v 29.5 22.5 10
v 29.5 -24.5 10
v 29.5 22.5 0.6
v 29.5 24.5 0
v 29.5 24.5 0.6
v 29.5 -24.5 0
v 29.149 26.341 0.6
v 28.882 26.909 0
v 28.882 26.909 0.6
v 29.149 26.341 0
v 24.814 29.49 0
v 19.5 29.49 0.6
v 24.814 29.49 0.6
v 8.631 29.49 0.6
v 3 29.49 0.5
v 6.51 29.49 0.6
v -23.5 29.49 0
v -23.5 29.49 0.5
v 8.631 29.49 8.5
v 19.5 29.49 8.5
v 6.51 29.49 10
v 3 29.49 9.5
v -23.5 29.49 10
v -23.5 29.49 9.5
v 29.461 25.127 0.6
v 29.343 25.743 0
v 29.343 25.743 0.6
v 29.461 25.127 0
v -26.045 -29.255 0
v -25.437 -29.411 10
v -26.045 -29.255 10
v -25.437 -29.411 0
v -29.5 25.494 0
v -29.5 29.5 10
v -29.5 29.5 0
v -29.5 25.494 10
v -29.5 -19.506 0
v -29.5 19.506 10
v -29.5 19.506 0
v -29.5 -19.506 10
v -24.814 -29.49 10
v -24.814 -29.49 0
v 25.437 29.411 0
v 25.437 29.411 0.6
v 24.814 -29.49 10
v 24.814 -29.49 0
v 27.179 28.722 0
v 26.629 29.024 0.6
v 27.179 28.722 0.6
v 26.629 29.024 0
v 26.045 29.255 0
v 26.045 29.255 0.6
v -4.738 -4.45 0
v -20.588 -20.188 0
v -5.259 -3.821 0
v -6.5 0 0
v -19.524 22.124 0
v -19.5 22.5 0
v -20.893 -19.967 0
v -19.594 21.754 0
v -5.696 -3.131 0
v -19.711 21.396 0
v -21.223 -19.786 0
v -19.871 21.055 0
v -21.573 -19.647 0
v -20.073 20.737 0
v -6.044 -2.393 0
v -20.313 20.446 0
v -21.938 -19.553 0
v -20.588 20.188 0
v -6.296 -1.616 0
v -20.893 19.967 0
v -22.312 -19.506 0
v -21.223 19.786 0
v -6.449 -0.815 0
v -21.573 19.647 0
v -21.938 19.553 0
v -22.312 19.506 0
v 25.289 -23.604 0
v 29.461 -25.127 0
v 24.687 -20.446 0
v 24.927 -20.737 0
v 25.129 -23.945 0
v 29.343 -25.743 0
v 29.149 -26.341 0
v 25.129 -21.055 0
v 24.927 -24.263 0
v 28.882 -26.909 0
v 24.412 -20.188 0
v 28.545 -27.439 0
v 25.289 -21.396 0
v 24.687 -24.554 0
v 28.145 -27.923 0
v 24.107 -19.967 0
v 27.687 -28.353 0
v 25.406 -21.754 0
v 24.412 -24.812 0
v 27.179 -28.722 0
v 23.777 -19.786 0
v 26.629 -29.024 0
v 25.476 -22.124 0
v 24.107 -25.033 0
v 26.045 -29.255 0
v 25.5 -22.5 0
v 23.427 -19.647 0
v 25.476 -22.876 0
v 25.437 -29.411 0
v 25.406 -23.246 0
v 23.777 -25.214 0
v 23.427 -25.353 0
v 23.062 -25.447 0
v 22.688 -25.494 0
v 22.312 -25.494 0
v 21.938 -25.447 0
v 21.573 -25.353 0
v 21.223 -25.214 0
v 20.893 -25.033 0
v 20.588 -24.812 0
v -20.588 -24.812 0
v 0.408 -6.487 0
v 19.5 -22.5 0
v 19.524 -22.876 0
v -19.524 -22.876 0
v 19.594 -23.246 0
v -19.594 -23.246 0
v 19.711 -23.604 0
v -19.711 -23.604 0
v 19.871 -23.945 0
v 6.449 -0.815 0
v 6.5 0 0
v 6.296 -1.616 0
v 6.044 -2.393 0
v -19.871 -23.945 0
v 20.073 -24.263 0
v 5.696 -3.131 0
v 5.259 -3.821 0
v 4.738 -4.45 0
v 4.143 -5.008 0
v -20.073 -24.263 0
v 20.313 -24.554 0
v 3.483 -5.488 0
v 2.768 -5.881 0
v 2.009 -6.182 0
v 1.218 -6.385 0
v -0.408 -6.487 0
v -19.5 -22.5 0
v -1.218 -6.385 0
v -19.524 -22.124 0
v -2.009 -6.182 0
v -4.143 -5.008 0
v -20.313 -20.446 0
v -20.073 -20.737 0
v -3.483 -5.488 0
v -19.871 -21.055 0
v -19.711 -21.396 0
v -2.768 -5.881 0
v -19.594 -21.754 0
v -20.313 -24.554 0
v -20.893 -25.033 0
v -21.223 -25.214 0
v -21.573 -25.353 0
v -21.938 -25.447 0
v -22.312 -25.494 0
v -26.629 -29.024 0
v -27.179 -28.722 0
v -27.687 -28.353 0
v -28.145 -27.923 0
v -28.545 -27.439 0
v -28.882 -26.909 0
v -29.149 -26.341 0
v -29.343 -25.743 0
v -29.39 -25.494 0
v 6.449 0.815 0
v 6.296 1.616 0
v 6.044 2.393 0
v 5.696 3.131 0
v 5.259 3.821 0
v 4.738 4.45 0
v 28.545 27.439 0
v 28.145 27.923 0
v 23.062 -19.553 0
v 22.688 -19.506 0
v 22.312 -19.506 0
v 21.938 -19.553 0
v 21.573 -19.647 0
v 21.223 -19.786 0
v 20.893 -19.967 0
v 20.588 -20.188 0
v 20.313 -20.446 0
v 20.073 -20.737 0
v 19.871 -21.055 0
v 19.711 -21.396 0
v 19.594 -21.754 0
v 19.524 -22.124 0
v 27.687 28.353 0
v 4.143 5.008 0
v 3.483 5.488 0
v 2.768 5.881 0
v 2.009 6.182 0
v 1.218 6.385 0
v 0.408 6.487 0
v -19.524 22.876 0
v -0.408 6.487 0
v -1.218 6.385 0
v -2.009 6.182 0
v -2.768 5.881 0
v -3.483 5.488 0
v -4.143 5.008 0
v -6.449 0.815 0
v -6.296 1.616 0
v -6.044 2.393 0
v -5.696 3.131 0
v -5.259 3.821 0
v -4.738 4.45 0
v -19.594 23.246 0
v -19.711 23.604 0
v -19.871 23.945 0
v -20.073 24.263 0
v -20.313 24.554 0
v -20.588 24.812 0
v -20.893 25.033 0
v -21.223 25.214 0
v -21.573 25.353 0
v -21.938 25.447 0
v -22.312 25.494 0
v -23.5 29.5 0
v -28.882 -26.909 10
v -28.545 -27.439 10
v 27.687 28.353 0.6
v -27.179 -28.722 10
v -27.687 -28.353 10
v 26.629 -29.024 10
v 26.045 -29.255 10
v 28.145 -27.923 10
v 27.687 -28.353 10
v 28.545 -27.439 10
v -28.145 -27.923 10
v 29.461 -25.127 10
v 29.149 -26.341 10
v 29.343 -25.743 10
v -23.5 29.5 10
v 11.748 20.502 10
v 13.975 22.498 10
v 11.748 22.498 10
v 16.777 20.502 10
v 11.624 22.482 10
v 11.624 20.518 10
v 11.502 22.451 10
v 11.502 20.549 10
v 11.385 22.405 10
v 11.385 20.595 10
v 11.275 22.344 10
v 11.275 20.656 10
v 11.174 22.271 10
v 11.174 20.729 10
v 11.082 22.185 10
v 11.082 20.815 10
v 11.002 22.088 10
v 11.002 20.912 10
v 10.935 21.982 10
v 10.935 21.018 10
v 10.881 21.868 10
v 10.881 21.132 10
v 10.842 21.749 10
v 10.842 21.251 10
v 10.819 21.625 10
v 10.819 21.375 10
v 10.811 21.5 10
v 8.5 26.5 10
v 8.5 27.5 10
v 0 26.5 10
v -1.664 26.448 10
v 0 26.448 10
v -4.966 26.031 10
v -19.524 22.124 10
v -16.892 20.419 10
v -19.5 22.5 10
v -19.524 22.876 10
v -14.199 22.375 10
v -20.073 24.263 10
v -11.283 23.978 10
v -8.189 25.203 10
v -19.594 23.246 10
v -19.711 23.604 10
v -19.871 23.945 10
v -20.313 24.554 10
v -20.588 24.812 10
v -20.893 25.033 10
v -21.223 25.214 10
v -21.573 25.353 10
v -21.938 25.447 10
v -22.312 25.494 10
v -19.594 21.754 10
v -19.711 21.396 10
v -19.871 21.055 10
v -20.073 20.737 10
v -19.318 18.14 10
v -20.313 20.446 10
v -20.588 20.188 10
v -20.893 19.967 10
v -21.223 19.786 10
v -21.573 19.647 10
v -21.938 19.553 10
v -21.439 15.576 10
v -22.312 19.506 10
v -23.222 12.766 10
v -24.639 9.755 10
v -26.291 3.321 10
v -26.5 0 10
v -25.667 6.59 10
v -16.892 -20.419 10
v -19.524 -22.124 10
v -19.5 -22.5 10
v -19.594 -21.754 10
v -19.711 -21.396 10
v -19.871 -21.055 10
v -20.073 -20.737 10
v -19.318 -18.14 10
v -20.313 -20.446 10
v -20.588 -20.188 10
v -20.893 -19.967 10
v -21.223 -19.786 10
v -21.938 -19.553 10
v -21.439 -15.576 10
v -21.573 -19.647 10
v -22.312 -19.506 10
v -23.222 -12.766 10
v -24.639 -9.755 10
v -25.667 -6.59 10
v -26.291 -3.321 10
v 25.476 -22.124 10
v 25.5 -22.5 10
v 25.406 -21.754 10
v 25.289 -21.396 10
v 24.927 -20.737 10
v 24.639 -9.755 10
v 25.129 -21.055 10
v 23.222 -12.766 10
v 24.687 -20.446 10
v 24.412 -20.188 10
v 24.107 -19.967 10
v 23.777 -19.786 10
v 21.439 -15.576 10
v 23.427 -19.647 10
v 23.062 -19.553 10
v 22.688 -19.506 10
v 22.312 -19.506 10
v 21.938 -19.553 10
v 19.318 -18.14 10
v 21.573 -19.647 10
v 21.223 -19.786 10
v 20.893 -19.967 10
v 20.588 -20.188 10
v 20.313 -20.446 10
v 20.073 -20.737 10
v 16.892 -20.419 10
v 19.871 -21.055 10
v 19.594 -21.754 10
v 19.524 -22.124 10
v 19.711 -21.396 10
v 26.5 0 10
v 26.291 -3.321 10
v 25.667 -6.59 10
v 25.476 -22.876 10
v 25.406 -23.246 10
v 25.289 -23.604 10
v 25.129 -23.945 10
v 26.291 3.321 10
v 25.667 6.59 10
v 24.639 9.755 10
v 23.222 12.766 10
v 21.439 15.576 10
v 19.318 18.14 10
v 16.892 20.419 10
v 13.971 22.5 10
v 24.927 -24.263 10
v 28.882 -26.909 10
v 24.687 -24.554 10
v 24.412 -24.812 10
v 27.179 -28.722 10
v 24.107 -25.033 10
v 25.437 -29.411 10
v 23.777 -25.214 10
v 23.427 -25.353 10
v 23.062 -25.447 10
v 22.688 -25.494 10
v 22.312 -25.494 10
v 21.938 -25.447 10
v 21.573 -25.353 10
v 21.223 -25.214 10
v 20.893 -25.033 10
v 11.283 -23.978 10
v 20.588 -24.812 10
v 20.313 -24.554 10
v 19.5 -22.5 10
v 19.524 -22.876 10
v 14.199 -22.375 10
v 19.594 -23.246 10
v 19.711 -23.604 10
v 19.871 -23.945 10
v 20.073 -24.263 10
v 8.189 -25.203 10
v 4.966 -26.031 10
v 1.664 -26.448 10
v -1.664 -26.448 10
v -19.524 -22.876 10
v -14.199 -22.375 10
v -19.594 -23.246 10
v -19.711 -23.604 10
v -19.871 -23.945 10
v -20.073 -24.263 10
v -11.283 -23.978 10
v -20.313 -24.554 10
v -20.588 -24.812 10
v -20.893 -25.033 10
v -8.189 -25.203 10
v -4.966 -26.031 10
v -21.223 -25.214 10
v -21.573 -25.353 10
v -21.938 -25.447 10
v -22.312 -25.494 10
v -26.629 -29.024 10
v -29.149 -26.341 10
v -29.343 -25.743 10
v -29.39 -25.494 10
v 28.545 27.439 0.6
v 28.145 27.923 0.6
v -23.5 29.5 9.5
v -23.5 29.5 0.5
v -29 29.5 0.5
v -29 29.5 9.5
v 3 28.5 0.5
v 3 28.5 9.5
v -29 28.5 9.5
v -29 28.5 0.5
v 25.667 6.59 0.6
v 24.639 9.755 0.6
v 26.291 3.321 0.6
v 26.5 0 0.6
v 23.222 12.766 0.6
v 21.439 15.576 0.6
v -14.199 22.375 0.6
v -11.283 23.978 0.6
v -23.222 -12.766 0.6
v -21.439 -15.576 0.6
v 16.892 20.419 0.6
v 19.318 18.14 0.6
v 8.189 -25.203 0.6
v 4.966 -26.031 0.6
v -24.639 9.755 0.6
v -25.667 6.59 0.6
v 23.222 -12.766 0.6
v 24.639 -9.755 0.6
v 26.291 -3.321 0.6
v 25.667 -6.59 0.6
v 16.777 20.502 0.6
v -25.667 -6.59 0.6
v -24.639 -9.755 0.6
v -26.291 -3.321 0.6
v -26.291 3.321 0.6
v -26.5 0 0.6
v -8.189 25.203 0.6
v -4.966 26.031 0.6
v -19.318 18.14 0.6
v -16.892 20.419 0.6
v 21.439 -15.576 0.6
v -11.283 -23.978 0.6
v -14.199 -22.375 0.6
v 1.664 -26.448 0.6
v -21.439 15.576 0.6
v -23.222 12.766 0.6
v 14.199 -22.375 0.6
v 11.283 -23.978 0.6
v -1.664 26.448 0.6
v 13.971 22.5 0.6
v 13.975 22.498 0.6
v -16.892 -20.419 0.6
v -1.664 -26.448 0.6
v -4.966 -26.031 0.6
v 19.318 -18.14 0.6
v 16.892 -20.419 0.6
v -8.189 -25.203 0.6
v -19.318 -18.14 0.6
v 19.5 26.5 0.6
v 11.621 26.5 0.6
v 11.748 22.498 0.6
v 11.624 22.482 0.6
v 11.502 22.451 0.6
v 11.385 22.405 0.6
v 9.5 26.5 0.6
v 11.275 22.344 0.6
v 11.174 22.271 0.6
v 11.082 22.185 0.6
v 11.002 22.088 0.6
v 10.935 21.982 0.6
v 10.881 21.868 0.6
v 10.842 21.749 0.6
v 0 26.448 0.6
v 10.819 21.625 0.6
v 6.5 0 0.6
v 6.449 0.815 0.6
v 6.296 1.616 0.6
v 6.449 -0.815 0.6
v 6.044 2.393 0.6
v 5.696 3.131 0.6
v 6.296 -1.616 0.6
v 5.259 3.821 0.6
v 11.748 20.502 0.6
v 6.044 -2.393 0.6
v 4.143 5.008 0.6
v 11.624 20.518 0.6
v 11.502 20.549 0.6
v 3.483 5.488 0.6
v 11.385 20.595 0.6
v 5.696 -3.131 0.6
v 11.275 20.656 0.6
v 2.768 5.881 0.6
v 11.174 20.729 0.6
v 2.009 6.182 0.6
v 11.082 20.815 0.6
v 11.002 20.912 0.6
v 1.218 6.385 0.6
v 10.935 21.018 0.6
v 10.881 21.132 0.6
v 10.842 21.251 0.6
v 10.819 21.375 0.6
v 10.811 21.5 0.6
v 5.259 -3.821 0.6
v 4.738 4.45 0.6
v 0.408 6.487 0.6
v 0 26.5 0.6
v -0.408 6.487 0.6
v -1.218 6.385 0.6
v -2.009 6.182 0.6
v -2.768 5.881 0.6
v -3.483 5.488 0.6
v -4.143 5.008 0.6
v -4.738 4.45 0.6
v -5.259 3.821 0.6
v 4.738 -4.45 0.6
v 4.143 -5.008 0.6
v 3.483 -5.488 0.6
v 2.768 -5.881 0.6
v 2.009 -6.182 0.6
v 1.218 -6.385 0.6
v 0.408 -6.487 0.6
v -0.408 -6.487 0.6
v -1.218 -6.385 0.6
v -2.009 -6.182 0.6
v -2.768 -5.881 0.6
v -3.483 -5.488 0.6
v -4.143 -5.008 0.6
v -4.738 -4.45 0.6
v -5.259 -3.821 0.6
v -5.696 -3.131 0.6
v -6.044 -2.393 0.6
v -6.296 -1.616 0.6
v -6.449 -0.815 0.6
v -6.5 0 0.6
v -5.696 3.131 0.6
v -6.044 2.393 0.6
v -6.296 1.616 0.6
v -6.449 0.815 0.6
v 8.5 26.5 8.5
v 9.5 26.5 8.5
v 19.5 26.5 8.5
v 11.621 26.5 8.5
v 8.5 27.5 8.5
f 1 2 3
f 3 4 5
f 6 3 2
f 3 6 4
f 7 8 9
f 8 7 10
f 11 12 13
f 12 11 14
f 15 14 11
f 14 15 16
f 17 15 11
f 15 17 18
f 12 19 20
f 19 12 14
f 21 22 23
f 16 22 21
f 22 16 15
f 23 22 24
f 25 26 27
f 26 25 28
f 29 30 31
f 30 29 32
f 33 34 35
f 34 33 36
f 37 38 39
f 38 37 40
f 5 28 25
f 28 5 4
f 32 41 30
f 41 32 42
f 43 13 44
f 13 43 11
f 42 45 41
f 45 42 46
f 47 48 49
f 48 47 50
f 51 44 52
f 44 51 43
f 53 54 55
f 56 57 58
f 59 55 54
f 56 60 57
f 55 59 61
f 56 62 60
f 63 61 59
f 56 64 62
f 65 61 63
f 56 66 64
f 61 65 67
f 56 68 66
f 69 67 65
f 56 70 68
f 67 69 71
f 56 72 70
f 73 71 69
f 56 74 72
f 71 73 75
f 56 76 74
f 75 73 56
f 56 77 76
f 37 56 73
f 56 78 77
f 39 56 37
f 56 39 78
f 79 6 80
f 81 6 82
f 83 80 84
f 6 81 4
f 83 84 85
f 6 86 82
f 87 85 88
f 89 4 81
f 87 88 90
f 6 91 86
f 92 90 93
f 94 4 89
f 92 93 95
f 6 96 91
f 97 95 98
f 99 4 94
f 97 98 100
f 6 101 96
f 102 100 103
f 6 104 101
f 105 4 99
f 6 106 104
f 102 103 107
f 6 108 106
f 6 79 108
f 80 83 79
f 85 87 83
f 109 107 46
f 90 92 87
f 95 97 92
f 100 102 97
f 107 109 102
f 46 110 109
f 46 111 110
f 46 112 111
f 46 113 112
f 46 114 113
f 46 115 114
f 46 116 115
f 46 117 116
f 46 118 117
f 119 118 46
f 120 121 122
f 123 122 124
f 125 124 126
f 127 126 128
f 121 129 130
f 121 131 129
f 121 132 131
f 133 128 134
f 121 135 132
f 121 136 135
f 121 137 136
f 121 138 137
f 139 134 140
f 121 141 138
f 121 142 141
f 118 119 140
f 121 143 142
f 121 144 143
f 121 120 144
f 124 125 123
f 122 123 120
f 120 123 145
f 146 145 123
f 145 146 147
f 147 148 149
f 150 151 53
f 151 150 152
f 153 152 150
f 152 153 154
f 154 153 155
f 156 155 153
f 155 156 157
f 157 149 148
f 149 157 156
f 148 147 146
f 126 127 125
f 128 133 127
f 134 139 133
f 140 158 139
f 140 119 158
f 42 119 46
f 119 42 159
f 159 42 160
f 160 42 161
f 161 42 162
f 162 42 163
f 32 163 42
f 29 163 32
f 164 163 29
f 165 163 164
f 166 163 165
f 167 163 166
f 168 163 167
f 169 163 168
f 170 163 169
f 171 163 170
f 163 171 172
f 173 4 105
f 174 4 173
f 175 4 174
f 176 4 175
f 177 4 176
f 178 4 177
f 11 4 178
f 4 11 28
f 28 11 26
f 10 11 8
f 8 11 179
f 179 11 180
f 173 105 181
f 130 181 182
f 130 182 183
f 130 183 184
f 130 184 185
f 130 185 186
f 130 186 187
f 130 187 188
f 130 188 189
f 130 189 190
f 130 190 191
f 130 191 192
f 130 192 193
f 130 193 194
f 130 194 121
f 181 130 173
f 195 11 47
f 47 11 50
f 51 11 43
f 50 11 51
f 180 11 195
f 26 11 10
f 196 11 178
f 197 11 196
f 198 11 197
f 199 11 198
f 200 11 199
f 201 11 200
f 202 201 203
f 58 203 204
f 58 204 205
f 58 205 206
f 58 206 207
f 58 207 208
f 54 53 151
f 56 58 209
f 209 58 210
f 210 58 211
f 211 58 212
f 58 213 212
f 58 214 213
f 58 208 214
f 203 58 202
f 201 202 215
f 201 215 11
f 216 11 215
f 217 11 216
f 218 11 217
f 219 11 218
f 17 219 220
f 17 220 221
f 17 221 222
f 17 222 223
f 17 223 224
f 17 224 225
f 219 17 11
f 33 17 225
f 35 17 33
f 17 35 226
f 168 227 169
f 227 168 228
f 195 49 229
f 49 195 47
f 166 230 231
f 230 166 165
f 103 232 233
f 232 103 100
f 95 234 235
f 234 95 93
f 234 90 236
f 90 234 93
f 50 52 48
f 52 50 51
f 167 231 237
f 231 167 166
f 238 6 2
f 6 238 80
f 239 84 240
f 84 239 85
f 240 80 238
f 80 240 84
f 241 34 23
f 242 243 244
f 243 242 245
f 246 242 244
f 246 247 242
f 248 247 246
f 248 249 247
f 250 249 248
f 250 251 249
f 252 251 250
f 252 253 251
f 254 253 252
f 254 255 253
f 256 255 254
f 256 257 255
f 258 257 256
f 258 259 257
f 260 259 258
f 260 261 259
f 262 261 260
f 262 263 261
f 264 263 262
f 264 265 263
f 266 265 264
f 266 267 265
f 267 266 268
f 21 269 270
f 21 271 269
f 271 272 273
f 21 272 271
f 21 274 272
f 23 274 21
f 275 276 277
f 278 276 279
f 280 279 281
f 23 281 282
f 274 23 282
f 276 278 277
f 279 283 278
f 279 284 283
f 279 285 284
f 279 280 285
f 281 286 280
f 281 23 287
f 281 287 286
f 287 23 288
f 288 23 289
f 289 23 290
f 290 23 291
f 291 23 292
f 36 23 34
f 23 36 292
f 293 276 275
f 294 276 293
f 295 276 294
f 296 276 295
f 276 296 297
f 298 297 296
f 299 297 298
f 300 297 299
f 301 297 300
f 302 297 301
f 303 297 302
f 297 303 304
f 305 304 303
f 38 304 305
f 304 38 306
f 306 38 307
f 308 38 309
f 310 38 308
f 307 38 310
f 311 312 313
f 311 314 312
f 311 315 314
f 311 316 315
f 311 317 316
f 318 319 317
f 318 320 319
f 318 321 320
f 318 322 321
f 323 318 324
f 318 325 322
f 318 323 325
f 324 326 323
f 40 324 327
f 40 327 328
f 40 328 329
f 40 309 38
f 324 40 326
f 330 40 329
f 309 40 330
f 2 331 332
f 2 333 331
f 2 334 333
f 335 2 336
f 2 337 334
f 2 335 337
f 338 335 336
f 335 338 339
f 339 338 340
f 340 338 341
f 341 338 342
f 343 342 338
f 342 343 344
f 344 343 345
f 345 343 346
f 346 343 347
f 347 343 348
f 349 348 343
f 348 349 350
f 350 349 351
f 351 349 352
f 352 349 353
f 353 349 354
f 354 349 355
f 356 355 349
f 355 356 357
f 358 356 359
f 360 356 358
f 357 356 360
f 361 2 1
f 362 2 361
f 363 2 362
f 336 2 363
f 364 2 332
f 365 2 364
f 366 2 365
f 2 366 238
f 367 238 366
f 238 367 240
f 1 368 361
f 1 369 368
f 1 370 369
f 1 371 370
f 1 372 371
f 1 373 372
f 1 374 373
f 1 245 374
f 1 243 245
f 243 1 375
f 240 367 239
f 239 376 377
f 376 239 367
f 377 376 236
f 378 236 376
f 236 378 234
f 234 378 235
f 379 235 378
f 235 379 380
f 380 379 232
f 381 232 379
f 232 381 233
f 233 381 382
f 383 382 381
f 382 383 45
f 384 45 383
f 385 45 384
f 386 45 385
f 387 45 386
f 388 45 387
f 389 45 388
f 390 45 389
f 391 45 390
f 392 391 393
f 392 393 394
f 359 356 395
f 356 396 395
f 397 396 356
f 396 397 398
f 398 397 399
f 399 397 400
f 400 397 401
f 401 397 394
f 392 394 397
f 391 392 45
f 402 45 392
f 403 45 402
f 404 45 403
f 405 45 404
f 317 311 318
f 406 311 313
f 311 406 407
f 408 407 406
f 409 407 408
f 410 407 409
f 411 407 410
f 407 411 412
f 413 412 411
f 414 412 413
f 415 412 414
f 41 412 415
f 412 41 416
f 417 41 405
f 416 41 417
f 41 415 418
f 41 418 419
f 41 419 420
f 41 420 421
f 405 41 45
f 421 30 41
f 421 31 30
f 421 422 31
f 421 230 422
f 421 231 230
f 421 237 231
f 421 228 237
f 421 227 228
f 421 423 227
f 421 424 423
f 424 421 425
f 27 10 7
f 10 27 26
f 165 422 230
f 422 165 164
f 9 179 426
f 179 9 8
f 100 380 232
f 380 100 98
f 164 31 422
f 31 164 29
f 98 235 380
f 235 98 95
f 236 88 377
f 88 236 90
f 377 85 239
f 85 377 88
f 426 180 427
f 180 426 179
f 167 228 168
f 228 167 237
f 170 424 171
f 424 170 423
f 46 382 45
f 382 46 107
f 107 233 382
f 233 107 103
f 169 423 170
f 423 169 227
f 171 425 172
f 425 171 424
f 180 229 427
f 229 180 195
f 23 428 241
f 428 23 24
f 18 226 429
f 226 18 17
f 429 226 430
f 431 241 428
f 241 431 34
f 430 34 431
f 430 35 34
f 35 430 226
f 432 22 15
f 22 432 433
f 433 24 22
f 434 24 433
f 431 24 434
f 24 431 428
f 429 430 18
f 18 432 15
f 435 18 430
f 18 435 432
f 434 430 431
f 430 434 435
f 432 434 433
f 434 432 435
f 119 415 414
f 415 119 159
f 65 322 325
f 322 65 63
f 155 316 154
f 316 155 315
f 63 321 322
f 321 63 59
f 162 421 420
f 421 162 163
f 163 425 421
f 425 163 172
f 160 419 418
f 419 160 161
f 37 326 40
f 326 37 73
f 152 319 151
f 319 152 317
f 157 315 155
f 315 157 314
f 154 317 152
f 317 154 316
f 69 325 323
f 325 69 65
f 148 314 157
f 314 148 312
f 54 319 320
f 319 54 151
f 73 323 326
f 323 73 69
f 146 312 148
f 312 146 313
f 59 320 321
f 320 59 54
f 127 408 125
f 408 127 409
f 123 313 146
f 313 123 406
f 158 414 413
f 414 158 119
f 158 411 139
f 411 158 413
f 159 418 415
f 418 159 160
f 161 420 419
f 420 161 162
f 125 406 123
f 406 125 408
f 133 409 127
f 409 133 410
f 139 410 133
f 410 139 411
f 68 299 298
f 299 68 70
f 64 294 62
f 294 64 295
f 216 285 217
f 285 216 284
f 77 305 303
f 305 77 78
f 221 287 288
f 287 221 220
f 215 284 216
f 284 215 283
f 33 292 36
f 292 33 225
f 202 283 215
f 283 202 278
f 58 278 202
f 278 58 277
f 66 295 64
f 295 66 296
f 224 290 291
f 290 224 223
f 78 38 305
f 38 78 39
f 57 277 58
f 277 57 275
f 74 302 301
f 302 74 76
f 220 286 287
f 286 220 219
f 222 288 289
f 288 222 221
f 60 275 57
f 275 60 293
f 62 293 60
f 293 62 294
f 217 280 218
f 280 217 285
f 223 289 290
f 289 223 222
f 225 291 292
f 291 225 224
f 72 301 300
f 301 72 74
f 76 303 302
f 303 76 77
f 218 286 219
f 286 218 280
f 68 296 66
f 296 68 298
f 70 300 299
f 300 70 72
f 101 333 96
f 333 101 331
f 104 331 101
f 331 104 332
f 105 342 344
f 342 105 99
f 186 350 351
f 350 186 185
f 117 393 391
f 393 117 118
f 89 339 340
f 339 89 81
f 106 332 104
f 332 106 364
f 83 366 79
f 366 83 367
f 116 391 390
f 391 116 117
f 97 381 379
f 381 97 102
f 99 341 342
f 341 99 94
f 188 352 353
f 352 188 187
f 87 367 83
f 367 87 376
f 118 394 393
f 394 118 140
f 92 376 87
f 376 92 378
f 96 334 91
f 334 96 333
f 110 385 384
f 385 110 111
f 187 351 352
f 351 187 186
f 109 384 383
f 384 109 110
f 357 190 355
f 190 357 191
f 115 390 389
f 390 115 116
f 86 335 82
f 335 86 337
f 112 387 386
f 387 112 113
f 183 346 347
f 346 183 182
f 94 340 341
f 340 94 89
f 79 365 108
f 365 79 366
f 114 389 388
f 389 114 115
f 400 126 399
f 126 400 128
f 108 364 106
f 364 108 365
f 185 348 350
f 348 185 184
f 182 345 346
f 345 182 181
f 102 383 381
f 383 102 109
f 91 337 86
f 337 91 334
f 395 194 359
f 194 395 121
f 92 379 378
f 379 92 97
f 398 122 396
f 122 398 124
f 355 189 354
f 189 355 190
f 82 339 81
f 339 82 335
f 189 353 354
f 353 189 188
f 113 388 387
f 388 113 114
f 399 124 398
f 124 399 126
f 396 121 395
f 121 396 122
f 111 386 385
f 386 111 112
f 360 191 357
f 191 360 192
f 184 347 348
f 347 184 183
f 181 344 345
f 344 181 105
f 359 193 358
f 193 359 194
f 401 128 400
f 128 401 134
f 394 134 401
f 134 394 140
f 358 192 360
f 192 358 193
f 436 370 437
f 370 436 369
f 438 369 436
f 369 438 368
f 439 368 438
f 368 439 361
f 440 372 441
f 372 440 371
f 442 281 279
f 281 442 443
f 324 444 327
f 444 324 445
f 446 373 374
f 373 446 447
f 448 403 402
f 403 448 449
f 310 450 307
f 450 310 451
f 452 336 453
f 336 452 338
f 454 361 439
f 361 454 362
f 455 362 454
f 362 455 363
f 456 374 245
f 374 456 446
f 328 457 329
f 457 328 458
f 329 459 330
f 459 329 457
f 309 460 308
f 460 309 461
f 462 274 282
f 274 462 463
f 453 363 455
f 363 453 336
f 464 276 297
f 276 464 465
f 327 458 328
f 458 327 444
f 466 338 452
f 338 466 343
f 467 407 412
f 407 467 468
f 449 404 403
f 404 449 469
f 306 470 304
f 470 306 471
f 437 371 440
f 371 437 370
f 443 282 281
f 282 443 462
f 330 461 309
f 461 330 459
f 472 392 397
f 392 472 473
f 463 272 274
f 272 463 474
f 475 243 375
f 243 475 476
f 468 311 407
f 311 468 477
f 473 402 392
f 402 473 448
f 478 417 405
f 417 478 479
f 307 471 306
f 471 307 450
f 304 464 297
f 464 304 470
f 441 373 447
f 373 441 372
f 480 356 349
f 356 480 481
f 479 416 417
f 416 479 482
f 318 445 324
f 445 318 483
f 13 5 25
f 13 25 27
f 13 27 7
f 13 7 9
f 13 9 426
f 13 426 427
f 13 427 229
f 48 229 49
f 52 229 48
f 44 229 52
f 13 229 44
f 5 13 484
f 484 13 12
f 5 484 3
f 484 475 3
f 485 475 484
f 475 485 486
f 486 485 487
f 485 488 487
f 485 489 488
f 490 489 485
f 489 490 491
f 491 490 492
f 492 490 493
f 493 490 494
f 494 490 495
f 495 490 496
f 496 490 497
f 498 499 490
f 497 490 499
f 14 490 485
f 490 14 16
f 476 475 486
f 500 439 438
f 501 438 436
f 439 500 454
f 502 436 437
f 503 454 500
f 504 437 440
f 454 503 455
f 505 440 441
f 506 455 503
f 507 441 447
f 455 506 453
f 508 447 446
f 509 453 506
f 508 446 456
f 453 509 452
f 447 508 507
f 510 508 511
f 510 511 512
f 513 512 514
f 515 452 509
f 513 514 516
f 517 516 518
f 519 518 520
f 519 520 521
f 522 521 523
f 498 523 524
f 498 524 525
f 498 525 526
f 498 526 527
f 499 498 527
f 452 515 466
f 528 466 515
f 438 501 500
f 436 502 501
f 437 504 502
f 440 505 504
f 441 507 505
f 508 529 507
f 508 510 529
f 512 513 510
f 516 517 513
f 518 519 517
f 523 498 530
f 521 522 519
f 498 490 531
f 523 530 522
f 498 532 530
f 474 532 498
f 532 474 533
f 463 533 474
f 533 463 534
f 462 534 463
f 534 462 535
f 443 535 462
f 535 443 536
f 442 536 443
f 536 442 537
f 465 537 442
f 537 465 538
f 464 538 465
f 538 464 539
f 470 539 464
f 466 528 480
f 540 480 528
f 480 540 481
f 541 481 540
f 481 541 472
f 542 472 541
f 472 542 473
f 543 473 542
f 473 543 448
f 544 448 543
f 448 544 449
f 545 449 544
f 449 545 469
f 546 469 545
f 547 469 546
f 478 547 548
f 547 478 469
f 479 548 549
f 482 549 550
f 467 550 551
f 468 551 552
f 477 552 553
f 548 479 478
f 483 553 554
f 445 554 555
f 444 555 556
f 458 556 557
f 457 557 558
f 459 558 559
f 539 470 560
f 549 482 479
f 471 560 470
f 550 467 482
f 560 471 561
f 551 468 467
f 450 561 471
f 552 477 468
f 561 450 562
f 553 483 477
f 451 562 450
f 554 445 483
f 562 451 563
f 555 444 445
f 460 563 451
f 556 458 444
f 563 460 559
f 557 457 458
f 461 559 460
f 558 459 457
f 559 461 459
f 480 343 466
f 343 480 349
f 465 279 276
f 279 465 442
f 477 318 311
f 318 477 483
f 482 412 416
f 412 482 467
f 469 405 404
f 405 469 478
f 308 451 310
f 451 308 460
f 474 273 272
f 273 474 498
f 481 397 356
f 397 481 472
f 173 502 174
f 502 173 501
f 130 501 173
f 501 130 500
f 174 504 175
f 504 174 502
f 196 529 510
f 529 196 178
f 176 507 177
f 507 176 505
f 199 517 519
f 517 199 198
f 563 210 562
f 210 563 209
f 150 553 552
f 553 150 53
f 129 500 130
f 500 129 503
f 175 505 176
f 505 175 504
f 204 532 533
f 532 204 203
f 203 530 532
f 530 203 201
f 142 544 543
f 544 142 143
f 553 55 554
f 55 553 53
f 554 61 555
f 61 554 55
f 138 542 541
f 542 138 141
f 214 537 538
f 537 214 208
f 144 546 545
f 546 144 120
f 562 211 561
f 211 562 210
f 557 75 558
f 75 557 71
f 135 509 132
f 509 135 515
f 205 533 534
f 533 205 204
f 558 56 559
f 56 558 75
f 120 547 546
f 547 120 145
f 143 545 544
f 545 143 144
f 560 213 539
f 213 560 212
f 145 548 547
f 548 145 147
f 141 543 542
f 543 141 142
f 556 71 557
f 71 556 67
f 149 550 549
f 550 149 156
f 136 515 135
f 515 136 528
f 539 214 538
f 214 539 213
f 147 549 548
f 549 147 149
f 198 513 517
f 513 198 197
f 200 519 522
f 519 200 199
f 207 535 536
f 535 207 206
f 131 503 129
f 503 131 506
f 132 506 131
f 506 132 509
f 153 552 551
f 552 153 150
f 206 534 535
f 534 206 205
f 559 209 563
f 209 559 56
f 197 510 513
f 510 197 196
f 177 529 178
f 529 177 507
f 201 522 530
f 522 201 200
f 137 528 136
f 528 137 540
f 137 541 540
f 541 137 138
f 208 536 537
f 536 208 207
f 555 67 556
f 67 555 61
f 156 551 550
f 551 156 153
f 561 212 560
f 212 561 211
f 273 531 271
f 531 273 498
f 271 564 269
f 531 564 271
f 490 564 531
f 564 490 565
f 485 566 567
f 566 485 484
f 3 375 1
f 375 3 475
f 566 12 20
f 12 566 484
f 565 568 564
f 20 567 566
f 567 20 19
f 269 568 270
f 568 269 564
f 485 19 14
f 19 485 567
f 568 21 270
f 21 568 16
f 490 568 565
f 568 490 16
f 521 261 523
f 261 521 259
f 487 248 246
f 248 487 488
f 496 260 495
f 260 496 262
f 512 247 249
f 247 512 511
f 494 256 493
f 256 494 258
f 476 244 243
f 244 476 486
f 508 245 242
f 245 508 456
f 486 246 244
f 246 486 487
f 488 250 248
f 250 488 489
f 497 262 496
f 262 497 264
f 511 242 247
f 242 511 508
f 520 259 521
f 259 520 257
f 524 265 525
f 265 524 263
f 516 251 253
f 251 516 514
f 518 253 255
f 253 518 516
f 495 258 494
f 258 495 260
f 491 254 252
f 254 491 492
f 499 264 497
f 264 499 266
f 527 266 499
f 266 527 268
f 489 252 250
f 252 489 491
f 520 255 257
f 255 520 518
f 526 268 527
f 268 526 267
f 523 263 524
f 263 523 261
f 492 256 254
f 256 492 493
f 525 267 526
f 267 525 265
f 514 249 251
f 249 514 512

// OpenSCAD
$fn = 50;


union() {
	difference() {
		union() {
			translate(v = [0, 0, 0]) {
				rotate(a = [0, 0, 0]) {
					hull() {
						translate(v = [-24.5000000000, 24.5000000000, 0]) {
							rotate(a = [0, 0, 0]) {
								translate(v = [0, 0, 0]) {
									rotate(a = [0, 0, 0]) {
										cylinder(h = 10, r = 5);
									}
								}
							}
						}
						translate(v = [24.5000000000, 24.5000000000, 0]) {
							rotate(a = [0, 0, 0]) {
								translate(v = [0, 0, 0]) {
									rotate(a = [0, 0, 0]) {
										cylinder(h = 10, r = 5);
									}
								}
							}
						}
						translate(v = [-24.5000000000, -24.5000000000, 0]) {
							rotate(a = [0, 0, 0]) {
								translate(v = [0, 0, 0]) {
									rotate(a = [0, 0, 0]) {
										cylinder(h = 10, r = 5);
									}
								}
							}
						}
						translate(v = [24.5000000000, -24.5000000000, 0]) {
							rotate(a = [0, 0, 0]) {
								translate(v = [0, 0, 0]) {
									rotate(a = [0, 0, 0]) {
										cylinder(h = 10, r = 5);
									}
								}
							}
						}
					}
				}
			}
			translate(v = [-29.5000000000, 23.5000000000, 0]) {
				rotate(a = [0, 0, 0]) {
					cube(size = [6, 6, 10]);
				}
			}
		}
		union() {
			#translate(v = [-29.0000000000, 28.5000000000, 0.5000000000]) {
				rotate(a = [0, 0, 0]) {
					cube(size = [32, 1, 9.0000000000]);
				}
			}
			translate(v = [-30.0000000000, -22.5000000000, -125]) {
				rotate(a = [0, 0, 0]) {
					hull() {
						translate(v = [7.5000000000, 0, 0]) {
							rotate(a = [0, 0, 0]) {
								translate(v = [0, 0, 0]) {
									rotate(a = [0, 0, 0]) {
										cylinder(h = 250, r = 3.0000000000);
									}
								}
							}
						}
						translate(v = [-7.5000000000, 0, 0]) {
							rotate(a = [0, 0, 0]) {
								translate(v = [0, 0, 0]) {
									rotate(a = [0, 0, 0]) {
										cylinder(h = 250, r = 3.0000000000);
									}
								}
							}
						}
					}
				}
			}
			translate(v = [-30.0000000000, 22.5000000000, -125]) {
				rotate(a = [0, 0, 0]) {
					hull() {
						translate(v = [7.5000000000, 0, 0]) {
							rotate(a = [0, 0, 0]) {
								translate(v = [0, 0, 0]) {
									rotate(a = [0, 0, 0]) {
										cylinder(h = 250, r = 3.0000000000);
									}
								}
							}
						}
						translate(v = [-7.5000000000, 0, 0]) {
							rotate(a = [0, 0, 0]) {
								translate(v = [0, 0, 0]) {
									rotate(a = [0, 0, 0]) {
										cylinder(h = 250, r = 3.0000000000);
									}
								}
							}
						}
					}
				}
			}
			translate(v = [22.5000000000, -22.5000000000, -125.0000000000]) {
				rotate(a = [0, 0, 0]) {
					cylinder(h = 250, r = 3.0000000000);
				}
			}
			translate(v = [0, 0, 0.6000000000]) {
				rotate(a = [0, 0, 0]) {
					cylinder(h = 12.4000000000, r = 26.5000000000);
				}
			}
			translate(v = [0, 0, -5.0000000000]) {
				rotate(a = [0, 0, 0]) {
					cylinder(h = 10, r = 6.5000000000);
				}
			}
			translate(v = [0.0000000000, 22.5000000000, 0.6000000000]) {
				rotate(a = [0, 0, 0]) {
					cube(size = [29.5000000000, 4, 12.4000000000]);
				}
			}
			translate(v = [19.5000000000, 22.5000000000, 0.6000000000]) {
				rotate(a = [0, 0, 0]) {
					cube(size = [10, 7, 12.4000000000]);
				}
			}
			translate(v = [8.5000000000, 22.5000000000, 8.5000000000]) {
				rotate(a = [0, 0, 0]) {
					cube(size = [21, 7, 1.5000000000]);
				}
			}
			translate(v = [5.7500000000, 30.2500000000, 0.6000000000]) {
				rotate(a = [0, 0, -45]) {
					cube(size = [7.5000000000, 1.5000000000, 12.4000000000]);
				}
			}
			translate(v = [5.0610000000, 20.5000000000, 0.6000000000]) {
				rotate(a = [0, 0, 0]) {
					cube(size = [7.5000000000, 2, 9.4000000000]);
				}
			}
		}
	}
	union() {
		translate(v = [14.3110000000, 21.5000000000, 0]) {
			rotate(a = [0, 0, 0]) {
				hull() {
					translate(v = [2.5000000000, 0, 0]) {
						rotate(a = [0, 0, 0]) {
							#translate(v = [0, 0, 0]) {
								rotate(a = [0, 0, 0]) {
									cylinder(h = 10, r = 1.0000000000);
								}
							}
						}
					}
					translate(v = [-2.5000000000, 0, 0]) {
						rotate(a = [0, 0, 0]) {
							#translate(v = [0, 0, 0]) {
								rotate(a = [0, 0, 0]) {
									cylinder(h = 10, r = 1.0000000000);
								}
							}
						}
					}
				}
			}
		}
	}
}
